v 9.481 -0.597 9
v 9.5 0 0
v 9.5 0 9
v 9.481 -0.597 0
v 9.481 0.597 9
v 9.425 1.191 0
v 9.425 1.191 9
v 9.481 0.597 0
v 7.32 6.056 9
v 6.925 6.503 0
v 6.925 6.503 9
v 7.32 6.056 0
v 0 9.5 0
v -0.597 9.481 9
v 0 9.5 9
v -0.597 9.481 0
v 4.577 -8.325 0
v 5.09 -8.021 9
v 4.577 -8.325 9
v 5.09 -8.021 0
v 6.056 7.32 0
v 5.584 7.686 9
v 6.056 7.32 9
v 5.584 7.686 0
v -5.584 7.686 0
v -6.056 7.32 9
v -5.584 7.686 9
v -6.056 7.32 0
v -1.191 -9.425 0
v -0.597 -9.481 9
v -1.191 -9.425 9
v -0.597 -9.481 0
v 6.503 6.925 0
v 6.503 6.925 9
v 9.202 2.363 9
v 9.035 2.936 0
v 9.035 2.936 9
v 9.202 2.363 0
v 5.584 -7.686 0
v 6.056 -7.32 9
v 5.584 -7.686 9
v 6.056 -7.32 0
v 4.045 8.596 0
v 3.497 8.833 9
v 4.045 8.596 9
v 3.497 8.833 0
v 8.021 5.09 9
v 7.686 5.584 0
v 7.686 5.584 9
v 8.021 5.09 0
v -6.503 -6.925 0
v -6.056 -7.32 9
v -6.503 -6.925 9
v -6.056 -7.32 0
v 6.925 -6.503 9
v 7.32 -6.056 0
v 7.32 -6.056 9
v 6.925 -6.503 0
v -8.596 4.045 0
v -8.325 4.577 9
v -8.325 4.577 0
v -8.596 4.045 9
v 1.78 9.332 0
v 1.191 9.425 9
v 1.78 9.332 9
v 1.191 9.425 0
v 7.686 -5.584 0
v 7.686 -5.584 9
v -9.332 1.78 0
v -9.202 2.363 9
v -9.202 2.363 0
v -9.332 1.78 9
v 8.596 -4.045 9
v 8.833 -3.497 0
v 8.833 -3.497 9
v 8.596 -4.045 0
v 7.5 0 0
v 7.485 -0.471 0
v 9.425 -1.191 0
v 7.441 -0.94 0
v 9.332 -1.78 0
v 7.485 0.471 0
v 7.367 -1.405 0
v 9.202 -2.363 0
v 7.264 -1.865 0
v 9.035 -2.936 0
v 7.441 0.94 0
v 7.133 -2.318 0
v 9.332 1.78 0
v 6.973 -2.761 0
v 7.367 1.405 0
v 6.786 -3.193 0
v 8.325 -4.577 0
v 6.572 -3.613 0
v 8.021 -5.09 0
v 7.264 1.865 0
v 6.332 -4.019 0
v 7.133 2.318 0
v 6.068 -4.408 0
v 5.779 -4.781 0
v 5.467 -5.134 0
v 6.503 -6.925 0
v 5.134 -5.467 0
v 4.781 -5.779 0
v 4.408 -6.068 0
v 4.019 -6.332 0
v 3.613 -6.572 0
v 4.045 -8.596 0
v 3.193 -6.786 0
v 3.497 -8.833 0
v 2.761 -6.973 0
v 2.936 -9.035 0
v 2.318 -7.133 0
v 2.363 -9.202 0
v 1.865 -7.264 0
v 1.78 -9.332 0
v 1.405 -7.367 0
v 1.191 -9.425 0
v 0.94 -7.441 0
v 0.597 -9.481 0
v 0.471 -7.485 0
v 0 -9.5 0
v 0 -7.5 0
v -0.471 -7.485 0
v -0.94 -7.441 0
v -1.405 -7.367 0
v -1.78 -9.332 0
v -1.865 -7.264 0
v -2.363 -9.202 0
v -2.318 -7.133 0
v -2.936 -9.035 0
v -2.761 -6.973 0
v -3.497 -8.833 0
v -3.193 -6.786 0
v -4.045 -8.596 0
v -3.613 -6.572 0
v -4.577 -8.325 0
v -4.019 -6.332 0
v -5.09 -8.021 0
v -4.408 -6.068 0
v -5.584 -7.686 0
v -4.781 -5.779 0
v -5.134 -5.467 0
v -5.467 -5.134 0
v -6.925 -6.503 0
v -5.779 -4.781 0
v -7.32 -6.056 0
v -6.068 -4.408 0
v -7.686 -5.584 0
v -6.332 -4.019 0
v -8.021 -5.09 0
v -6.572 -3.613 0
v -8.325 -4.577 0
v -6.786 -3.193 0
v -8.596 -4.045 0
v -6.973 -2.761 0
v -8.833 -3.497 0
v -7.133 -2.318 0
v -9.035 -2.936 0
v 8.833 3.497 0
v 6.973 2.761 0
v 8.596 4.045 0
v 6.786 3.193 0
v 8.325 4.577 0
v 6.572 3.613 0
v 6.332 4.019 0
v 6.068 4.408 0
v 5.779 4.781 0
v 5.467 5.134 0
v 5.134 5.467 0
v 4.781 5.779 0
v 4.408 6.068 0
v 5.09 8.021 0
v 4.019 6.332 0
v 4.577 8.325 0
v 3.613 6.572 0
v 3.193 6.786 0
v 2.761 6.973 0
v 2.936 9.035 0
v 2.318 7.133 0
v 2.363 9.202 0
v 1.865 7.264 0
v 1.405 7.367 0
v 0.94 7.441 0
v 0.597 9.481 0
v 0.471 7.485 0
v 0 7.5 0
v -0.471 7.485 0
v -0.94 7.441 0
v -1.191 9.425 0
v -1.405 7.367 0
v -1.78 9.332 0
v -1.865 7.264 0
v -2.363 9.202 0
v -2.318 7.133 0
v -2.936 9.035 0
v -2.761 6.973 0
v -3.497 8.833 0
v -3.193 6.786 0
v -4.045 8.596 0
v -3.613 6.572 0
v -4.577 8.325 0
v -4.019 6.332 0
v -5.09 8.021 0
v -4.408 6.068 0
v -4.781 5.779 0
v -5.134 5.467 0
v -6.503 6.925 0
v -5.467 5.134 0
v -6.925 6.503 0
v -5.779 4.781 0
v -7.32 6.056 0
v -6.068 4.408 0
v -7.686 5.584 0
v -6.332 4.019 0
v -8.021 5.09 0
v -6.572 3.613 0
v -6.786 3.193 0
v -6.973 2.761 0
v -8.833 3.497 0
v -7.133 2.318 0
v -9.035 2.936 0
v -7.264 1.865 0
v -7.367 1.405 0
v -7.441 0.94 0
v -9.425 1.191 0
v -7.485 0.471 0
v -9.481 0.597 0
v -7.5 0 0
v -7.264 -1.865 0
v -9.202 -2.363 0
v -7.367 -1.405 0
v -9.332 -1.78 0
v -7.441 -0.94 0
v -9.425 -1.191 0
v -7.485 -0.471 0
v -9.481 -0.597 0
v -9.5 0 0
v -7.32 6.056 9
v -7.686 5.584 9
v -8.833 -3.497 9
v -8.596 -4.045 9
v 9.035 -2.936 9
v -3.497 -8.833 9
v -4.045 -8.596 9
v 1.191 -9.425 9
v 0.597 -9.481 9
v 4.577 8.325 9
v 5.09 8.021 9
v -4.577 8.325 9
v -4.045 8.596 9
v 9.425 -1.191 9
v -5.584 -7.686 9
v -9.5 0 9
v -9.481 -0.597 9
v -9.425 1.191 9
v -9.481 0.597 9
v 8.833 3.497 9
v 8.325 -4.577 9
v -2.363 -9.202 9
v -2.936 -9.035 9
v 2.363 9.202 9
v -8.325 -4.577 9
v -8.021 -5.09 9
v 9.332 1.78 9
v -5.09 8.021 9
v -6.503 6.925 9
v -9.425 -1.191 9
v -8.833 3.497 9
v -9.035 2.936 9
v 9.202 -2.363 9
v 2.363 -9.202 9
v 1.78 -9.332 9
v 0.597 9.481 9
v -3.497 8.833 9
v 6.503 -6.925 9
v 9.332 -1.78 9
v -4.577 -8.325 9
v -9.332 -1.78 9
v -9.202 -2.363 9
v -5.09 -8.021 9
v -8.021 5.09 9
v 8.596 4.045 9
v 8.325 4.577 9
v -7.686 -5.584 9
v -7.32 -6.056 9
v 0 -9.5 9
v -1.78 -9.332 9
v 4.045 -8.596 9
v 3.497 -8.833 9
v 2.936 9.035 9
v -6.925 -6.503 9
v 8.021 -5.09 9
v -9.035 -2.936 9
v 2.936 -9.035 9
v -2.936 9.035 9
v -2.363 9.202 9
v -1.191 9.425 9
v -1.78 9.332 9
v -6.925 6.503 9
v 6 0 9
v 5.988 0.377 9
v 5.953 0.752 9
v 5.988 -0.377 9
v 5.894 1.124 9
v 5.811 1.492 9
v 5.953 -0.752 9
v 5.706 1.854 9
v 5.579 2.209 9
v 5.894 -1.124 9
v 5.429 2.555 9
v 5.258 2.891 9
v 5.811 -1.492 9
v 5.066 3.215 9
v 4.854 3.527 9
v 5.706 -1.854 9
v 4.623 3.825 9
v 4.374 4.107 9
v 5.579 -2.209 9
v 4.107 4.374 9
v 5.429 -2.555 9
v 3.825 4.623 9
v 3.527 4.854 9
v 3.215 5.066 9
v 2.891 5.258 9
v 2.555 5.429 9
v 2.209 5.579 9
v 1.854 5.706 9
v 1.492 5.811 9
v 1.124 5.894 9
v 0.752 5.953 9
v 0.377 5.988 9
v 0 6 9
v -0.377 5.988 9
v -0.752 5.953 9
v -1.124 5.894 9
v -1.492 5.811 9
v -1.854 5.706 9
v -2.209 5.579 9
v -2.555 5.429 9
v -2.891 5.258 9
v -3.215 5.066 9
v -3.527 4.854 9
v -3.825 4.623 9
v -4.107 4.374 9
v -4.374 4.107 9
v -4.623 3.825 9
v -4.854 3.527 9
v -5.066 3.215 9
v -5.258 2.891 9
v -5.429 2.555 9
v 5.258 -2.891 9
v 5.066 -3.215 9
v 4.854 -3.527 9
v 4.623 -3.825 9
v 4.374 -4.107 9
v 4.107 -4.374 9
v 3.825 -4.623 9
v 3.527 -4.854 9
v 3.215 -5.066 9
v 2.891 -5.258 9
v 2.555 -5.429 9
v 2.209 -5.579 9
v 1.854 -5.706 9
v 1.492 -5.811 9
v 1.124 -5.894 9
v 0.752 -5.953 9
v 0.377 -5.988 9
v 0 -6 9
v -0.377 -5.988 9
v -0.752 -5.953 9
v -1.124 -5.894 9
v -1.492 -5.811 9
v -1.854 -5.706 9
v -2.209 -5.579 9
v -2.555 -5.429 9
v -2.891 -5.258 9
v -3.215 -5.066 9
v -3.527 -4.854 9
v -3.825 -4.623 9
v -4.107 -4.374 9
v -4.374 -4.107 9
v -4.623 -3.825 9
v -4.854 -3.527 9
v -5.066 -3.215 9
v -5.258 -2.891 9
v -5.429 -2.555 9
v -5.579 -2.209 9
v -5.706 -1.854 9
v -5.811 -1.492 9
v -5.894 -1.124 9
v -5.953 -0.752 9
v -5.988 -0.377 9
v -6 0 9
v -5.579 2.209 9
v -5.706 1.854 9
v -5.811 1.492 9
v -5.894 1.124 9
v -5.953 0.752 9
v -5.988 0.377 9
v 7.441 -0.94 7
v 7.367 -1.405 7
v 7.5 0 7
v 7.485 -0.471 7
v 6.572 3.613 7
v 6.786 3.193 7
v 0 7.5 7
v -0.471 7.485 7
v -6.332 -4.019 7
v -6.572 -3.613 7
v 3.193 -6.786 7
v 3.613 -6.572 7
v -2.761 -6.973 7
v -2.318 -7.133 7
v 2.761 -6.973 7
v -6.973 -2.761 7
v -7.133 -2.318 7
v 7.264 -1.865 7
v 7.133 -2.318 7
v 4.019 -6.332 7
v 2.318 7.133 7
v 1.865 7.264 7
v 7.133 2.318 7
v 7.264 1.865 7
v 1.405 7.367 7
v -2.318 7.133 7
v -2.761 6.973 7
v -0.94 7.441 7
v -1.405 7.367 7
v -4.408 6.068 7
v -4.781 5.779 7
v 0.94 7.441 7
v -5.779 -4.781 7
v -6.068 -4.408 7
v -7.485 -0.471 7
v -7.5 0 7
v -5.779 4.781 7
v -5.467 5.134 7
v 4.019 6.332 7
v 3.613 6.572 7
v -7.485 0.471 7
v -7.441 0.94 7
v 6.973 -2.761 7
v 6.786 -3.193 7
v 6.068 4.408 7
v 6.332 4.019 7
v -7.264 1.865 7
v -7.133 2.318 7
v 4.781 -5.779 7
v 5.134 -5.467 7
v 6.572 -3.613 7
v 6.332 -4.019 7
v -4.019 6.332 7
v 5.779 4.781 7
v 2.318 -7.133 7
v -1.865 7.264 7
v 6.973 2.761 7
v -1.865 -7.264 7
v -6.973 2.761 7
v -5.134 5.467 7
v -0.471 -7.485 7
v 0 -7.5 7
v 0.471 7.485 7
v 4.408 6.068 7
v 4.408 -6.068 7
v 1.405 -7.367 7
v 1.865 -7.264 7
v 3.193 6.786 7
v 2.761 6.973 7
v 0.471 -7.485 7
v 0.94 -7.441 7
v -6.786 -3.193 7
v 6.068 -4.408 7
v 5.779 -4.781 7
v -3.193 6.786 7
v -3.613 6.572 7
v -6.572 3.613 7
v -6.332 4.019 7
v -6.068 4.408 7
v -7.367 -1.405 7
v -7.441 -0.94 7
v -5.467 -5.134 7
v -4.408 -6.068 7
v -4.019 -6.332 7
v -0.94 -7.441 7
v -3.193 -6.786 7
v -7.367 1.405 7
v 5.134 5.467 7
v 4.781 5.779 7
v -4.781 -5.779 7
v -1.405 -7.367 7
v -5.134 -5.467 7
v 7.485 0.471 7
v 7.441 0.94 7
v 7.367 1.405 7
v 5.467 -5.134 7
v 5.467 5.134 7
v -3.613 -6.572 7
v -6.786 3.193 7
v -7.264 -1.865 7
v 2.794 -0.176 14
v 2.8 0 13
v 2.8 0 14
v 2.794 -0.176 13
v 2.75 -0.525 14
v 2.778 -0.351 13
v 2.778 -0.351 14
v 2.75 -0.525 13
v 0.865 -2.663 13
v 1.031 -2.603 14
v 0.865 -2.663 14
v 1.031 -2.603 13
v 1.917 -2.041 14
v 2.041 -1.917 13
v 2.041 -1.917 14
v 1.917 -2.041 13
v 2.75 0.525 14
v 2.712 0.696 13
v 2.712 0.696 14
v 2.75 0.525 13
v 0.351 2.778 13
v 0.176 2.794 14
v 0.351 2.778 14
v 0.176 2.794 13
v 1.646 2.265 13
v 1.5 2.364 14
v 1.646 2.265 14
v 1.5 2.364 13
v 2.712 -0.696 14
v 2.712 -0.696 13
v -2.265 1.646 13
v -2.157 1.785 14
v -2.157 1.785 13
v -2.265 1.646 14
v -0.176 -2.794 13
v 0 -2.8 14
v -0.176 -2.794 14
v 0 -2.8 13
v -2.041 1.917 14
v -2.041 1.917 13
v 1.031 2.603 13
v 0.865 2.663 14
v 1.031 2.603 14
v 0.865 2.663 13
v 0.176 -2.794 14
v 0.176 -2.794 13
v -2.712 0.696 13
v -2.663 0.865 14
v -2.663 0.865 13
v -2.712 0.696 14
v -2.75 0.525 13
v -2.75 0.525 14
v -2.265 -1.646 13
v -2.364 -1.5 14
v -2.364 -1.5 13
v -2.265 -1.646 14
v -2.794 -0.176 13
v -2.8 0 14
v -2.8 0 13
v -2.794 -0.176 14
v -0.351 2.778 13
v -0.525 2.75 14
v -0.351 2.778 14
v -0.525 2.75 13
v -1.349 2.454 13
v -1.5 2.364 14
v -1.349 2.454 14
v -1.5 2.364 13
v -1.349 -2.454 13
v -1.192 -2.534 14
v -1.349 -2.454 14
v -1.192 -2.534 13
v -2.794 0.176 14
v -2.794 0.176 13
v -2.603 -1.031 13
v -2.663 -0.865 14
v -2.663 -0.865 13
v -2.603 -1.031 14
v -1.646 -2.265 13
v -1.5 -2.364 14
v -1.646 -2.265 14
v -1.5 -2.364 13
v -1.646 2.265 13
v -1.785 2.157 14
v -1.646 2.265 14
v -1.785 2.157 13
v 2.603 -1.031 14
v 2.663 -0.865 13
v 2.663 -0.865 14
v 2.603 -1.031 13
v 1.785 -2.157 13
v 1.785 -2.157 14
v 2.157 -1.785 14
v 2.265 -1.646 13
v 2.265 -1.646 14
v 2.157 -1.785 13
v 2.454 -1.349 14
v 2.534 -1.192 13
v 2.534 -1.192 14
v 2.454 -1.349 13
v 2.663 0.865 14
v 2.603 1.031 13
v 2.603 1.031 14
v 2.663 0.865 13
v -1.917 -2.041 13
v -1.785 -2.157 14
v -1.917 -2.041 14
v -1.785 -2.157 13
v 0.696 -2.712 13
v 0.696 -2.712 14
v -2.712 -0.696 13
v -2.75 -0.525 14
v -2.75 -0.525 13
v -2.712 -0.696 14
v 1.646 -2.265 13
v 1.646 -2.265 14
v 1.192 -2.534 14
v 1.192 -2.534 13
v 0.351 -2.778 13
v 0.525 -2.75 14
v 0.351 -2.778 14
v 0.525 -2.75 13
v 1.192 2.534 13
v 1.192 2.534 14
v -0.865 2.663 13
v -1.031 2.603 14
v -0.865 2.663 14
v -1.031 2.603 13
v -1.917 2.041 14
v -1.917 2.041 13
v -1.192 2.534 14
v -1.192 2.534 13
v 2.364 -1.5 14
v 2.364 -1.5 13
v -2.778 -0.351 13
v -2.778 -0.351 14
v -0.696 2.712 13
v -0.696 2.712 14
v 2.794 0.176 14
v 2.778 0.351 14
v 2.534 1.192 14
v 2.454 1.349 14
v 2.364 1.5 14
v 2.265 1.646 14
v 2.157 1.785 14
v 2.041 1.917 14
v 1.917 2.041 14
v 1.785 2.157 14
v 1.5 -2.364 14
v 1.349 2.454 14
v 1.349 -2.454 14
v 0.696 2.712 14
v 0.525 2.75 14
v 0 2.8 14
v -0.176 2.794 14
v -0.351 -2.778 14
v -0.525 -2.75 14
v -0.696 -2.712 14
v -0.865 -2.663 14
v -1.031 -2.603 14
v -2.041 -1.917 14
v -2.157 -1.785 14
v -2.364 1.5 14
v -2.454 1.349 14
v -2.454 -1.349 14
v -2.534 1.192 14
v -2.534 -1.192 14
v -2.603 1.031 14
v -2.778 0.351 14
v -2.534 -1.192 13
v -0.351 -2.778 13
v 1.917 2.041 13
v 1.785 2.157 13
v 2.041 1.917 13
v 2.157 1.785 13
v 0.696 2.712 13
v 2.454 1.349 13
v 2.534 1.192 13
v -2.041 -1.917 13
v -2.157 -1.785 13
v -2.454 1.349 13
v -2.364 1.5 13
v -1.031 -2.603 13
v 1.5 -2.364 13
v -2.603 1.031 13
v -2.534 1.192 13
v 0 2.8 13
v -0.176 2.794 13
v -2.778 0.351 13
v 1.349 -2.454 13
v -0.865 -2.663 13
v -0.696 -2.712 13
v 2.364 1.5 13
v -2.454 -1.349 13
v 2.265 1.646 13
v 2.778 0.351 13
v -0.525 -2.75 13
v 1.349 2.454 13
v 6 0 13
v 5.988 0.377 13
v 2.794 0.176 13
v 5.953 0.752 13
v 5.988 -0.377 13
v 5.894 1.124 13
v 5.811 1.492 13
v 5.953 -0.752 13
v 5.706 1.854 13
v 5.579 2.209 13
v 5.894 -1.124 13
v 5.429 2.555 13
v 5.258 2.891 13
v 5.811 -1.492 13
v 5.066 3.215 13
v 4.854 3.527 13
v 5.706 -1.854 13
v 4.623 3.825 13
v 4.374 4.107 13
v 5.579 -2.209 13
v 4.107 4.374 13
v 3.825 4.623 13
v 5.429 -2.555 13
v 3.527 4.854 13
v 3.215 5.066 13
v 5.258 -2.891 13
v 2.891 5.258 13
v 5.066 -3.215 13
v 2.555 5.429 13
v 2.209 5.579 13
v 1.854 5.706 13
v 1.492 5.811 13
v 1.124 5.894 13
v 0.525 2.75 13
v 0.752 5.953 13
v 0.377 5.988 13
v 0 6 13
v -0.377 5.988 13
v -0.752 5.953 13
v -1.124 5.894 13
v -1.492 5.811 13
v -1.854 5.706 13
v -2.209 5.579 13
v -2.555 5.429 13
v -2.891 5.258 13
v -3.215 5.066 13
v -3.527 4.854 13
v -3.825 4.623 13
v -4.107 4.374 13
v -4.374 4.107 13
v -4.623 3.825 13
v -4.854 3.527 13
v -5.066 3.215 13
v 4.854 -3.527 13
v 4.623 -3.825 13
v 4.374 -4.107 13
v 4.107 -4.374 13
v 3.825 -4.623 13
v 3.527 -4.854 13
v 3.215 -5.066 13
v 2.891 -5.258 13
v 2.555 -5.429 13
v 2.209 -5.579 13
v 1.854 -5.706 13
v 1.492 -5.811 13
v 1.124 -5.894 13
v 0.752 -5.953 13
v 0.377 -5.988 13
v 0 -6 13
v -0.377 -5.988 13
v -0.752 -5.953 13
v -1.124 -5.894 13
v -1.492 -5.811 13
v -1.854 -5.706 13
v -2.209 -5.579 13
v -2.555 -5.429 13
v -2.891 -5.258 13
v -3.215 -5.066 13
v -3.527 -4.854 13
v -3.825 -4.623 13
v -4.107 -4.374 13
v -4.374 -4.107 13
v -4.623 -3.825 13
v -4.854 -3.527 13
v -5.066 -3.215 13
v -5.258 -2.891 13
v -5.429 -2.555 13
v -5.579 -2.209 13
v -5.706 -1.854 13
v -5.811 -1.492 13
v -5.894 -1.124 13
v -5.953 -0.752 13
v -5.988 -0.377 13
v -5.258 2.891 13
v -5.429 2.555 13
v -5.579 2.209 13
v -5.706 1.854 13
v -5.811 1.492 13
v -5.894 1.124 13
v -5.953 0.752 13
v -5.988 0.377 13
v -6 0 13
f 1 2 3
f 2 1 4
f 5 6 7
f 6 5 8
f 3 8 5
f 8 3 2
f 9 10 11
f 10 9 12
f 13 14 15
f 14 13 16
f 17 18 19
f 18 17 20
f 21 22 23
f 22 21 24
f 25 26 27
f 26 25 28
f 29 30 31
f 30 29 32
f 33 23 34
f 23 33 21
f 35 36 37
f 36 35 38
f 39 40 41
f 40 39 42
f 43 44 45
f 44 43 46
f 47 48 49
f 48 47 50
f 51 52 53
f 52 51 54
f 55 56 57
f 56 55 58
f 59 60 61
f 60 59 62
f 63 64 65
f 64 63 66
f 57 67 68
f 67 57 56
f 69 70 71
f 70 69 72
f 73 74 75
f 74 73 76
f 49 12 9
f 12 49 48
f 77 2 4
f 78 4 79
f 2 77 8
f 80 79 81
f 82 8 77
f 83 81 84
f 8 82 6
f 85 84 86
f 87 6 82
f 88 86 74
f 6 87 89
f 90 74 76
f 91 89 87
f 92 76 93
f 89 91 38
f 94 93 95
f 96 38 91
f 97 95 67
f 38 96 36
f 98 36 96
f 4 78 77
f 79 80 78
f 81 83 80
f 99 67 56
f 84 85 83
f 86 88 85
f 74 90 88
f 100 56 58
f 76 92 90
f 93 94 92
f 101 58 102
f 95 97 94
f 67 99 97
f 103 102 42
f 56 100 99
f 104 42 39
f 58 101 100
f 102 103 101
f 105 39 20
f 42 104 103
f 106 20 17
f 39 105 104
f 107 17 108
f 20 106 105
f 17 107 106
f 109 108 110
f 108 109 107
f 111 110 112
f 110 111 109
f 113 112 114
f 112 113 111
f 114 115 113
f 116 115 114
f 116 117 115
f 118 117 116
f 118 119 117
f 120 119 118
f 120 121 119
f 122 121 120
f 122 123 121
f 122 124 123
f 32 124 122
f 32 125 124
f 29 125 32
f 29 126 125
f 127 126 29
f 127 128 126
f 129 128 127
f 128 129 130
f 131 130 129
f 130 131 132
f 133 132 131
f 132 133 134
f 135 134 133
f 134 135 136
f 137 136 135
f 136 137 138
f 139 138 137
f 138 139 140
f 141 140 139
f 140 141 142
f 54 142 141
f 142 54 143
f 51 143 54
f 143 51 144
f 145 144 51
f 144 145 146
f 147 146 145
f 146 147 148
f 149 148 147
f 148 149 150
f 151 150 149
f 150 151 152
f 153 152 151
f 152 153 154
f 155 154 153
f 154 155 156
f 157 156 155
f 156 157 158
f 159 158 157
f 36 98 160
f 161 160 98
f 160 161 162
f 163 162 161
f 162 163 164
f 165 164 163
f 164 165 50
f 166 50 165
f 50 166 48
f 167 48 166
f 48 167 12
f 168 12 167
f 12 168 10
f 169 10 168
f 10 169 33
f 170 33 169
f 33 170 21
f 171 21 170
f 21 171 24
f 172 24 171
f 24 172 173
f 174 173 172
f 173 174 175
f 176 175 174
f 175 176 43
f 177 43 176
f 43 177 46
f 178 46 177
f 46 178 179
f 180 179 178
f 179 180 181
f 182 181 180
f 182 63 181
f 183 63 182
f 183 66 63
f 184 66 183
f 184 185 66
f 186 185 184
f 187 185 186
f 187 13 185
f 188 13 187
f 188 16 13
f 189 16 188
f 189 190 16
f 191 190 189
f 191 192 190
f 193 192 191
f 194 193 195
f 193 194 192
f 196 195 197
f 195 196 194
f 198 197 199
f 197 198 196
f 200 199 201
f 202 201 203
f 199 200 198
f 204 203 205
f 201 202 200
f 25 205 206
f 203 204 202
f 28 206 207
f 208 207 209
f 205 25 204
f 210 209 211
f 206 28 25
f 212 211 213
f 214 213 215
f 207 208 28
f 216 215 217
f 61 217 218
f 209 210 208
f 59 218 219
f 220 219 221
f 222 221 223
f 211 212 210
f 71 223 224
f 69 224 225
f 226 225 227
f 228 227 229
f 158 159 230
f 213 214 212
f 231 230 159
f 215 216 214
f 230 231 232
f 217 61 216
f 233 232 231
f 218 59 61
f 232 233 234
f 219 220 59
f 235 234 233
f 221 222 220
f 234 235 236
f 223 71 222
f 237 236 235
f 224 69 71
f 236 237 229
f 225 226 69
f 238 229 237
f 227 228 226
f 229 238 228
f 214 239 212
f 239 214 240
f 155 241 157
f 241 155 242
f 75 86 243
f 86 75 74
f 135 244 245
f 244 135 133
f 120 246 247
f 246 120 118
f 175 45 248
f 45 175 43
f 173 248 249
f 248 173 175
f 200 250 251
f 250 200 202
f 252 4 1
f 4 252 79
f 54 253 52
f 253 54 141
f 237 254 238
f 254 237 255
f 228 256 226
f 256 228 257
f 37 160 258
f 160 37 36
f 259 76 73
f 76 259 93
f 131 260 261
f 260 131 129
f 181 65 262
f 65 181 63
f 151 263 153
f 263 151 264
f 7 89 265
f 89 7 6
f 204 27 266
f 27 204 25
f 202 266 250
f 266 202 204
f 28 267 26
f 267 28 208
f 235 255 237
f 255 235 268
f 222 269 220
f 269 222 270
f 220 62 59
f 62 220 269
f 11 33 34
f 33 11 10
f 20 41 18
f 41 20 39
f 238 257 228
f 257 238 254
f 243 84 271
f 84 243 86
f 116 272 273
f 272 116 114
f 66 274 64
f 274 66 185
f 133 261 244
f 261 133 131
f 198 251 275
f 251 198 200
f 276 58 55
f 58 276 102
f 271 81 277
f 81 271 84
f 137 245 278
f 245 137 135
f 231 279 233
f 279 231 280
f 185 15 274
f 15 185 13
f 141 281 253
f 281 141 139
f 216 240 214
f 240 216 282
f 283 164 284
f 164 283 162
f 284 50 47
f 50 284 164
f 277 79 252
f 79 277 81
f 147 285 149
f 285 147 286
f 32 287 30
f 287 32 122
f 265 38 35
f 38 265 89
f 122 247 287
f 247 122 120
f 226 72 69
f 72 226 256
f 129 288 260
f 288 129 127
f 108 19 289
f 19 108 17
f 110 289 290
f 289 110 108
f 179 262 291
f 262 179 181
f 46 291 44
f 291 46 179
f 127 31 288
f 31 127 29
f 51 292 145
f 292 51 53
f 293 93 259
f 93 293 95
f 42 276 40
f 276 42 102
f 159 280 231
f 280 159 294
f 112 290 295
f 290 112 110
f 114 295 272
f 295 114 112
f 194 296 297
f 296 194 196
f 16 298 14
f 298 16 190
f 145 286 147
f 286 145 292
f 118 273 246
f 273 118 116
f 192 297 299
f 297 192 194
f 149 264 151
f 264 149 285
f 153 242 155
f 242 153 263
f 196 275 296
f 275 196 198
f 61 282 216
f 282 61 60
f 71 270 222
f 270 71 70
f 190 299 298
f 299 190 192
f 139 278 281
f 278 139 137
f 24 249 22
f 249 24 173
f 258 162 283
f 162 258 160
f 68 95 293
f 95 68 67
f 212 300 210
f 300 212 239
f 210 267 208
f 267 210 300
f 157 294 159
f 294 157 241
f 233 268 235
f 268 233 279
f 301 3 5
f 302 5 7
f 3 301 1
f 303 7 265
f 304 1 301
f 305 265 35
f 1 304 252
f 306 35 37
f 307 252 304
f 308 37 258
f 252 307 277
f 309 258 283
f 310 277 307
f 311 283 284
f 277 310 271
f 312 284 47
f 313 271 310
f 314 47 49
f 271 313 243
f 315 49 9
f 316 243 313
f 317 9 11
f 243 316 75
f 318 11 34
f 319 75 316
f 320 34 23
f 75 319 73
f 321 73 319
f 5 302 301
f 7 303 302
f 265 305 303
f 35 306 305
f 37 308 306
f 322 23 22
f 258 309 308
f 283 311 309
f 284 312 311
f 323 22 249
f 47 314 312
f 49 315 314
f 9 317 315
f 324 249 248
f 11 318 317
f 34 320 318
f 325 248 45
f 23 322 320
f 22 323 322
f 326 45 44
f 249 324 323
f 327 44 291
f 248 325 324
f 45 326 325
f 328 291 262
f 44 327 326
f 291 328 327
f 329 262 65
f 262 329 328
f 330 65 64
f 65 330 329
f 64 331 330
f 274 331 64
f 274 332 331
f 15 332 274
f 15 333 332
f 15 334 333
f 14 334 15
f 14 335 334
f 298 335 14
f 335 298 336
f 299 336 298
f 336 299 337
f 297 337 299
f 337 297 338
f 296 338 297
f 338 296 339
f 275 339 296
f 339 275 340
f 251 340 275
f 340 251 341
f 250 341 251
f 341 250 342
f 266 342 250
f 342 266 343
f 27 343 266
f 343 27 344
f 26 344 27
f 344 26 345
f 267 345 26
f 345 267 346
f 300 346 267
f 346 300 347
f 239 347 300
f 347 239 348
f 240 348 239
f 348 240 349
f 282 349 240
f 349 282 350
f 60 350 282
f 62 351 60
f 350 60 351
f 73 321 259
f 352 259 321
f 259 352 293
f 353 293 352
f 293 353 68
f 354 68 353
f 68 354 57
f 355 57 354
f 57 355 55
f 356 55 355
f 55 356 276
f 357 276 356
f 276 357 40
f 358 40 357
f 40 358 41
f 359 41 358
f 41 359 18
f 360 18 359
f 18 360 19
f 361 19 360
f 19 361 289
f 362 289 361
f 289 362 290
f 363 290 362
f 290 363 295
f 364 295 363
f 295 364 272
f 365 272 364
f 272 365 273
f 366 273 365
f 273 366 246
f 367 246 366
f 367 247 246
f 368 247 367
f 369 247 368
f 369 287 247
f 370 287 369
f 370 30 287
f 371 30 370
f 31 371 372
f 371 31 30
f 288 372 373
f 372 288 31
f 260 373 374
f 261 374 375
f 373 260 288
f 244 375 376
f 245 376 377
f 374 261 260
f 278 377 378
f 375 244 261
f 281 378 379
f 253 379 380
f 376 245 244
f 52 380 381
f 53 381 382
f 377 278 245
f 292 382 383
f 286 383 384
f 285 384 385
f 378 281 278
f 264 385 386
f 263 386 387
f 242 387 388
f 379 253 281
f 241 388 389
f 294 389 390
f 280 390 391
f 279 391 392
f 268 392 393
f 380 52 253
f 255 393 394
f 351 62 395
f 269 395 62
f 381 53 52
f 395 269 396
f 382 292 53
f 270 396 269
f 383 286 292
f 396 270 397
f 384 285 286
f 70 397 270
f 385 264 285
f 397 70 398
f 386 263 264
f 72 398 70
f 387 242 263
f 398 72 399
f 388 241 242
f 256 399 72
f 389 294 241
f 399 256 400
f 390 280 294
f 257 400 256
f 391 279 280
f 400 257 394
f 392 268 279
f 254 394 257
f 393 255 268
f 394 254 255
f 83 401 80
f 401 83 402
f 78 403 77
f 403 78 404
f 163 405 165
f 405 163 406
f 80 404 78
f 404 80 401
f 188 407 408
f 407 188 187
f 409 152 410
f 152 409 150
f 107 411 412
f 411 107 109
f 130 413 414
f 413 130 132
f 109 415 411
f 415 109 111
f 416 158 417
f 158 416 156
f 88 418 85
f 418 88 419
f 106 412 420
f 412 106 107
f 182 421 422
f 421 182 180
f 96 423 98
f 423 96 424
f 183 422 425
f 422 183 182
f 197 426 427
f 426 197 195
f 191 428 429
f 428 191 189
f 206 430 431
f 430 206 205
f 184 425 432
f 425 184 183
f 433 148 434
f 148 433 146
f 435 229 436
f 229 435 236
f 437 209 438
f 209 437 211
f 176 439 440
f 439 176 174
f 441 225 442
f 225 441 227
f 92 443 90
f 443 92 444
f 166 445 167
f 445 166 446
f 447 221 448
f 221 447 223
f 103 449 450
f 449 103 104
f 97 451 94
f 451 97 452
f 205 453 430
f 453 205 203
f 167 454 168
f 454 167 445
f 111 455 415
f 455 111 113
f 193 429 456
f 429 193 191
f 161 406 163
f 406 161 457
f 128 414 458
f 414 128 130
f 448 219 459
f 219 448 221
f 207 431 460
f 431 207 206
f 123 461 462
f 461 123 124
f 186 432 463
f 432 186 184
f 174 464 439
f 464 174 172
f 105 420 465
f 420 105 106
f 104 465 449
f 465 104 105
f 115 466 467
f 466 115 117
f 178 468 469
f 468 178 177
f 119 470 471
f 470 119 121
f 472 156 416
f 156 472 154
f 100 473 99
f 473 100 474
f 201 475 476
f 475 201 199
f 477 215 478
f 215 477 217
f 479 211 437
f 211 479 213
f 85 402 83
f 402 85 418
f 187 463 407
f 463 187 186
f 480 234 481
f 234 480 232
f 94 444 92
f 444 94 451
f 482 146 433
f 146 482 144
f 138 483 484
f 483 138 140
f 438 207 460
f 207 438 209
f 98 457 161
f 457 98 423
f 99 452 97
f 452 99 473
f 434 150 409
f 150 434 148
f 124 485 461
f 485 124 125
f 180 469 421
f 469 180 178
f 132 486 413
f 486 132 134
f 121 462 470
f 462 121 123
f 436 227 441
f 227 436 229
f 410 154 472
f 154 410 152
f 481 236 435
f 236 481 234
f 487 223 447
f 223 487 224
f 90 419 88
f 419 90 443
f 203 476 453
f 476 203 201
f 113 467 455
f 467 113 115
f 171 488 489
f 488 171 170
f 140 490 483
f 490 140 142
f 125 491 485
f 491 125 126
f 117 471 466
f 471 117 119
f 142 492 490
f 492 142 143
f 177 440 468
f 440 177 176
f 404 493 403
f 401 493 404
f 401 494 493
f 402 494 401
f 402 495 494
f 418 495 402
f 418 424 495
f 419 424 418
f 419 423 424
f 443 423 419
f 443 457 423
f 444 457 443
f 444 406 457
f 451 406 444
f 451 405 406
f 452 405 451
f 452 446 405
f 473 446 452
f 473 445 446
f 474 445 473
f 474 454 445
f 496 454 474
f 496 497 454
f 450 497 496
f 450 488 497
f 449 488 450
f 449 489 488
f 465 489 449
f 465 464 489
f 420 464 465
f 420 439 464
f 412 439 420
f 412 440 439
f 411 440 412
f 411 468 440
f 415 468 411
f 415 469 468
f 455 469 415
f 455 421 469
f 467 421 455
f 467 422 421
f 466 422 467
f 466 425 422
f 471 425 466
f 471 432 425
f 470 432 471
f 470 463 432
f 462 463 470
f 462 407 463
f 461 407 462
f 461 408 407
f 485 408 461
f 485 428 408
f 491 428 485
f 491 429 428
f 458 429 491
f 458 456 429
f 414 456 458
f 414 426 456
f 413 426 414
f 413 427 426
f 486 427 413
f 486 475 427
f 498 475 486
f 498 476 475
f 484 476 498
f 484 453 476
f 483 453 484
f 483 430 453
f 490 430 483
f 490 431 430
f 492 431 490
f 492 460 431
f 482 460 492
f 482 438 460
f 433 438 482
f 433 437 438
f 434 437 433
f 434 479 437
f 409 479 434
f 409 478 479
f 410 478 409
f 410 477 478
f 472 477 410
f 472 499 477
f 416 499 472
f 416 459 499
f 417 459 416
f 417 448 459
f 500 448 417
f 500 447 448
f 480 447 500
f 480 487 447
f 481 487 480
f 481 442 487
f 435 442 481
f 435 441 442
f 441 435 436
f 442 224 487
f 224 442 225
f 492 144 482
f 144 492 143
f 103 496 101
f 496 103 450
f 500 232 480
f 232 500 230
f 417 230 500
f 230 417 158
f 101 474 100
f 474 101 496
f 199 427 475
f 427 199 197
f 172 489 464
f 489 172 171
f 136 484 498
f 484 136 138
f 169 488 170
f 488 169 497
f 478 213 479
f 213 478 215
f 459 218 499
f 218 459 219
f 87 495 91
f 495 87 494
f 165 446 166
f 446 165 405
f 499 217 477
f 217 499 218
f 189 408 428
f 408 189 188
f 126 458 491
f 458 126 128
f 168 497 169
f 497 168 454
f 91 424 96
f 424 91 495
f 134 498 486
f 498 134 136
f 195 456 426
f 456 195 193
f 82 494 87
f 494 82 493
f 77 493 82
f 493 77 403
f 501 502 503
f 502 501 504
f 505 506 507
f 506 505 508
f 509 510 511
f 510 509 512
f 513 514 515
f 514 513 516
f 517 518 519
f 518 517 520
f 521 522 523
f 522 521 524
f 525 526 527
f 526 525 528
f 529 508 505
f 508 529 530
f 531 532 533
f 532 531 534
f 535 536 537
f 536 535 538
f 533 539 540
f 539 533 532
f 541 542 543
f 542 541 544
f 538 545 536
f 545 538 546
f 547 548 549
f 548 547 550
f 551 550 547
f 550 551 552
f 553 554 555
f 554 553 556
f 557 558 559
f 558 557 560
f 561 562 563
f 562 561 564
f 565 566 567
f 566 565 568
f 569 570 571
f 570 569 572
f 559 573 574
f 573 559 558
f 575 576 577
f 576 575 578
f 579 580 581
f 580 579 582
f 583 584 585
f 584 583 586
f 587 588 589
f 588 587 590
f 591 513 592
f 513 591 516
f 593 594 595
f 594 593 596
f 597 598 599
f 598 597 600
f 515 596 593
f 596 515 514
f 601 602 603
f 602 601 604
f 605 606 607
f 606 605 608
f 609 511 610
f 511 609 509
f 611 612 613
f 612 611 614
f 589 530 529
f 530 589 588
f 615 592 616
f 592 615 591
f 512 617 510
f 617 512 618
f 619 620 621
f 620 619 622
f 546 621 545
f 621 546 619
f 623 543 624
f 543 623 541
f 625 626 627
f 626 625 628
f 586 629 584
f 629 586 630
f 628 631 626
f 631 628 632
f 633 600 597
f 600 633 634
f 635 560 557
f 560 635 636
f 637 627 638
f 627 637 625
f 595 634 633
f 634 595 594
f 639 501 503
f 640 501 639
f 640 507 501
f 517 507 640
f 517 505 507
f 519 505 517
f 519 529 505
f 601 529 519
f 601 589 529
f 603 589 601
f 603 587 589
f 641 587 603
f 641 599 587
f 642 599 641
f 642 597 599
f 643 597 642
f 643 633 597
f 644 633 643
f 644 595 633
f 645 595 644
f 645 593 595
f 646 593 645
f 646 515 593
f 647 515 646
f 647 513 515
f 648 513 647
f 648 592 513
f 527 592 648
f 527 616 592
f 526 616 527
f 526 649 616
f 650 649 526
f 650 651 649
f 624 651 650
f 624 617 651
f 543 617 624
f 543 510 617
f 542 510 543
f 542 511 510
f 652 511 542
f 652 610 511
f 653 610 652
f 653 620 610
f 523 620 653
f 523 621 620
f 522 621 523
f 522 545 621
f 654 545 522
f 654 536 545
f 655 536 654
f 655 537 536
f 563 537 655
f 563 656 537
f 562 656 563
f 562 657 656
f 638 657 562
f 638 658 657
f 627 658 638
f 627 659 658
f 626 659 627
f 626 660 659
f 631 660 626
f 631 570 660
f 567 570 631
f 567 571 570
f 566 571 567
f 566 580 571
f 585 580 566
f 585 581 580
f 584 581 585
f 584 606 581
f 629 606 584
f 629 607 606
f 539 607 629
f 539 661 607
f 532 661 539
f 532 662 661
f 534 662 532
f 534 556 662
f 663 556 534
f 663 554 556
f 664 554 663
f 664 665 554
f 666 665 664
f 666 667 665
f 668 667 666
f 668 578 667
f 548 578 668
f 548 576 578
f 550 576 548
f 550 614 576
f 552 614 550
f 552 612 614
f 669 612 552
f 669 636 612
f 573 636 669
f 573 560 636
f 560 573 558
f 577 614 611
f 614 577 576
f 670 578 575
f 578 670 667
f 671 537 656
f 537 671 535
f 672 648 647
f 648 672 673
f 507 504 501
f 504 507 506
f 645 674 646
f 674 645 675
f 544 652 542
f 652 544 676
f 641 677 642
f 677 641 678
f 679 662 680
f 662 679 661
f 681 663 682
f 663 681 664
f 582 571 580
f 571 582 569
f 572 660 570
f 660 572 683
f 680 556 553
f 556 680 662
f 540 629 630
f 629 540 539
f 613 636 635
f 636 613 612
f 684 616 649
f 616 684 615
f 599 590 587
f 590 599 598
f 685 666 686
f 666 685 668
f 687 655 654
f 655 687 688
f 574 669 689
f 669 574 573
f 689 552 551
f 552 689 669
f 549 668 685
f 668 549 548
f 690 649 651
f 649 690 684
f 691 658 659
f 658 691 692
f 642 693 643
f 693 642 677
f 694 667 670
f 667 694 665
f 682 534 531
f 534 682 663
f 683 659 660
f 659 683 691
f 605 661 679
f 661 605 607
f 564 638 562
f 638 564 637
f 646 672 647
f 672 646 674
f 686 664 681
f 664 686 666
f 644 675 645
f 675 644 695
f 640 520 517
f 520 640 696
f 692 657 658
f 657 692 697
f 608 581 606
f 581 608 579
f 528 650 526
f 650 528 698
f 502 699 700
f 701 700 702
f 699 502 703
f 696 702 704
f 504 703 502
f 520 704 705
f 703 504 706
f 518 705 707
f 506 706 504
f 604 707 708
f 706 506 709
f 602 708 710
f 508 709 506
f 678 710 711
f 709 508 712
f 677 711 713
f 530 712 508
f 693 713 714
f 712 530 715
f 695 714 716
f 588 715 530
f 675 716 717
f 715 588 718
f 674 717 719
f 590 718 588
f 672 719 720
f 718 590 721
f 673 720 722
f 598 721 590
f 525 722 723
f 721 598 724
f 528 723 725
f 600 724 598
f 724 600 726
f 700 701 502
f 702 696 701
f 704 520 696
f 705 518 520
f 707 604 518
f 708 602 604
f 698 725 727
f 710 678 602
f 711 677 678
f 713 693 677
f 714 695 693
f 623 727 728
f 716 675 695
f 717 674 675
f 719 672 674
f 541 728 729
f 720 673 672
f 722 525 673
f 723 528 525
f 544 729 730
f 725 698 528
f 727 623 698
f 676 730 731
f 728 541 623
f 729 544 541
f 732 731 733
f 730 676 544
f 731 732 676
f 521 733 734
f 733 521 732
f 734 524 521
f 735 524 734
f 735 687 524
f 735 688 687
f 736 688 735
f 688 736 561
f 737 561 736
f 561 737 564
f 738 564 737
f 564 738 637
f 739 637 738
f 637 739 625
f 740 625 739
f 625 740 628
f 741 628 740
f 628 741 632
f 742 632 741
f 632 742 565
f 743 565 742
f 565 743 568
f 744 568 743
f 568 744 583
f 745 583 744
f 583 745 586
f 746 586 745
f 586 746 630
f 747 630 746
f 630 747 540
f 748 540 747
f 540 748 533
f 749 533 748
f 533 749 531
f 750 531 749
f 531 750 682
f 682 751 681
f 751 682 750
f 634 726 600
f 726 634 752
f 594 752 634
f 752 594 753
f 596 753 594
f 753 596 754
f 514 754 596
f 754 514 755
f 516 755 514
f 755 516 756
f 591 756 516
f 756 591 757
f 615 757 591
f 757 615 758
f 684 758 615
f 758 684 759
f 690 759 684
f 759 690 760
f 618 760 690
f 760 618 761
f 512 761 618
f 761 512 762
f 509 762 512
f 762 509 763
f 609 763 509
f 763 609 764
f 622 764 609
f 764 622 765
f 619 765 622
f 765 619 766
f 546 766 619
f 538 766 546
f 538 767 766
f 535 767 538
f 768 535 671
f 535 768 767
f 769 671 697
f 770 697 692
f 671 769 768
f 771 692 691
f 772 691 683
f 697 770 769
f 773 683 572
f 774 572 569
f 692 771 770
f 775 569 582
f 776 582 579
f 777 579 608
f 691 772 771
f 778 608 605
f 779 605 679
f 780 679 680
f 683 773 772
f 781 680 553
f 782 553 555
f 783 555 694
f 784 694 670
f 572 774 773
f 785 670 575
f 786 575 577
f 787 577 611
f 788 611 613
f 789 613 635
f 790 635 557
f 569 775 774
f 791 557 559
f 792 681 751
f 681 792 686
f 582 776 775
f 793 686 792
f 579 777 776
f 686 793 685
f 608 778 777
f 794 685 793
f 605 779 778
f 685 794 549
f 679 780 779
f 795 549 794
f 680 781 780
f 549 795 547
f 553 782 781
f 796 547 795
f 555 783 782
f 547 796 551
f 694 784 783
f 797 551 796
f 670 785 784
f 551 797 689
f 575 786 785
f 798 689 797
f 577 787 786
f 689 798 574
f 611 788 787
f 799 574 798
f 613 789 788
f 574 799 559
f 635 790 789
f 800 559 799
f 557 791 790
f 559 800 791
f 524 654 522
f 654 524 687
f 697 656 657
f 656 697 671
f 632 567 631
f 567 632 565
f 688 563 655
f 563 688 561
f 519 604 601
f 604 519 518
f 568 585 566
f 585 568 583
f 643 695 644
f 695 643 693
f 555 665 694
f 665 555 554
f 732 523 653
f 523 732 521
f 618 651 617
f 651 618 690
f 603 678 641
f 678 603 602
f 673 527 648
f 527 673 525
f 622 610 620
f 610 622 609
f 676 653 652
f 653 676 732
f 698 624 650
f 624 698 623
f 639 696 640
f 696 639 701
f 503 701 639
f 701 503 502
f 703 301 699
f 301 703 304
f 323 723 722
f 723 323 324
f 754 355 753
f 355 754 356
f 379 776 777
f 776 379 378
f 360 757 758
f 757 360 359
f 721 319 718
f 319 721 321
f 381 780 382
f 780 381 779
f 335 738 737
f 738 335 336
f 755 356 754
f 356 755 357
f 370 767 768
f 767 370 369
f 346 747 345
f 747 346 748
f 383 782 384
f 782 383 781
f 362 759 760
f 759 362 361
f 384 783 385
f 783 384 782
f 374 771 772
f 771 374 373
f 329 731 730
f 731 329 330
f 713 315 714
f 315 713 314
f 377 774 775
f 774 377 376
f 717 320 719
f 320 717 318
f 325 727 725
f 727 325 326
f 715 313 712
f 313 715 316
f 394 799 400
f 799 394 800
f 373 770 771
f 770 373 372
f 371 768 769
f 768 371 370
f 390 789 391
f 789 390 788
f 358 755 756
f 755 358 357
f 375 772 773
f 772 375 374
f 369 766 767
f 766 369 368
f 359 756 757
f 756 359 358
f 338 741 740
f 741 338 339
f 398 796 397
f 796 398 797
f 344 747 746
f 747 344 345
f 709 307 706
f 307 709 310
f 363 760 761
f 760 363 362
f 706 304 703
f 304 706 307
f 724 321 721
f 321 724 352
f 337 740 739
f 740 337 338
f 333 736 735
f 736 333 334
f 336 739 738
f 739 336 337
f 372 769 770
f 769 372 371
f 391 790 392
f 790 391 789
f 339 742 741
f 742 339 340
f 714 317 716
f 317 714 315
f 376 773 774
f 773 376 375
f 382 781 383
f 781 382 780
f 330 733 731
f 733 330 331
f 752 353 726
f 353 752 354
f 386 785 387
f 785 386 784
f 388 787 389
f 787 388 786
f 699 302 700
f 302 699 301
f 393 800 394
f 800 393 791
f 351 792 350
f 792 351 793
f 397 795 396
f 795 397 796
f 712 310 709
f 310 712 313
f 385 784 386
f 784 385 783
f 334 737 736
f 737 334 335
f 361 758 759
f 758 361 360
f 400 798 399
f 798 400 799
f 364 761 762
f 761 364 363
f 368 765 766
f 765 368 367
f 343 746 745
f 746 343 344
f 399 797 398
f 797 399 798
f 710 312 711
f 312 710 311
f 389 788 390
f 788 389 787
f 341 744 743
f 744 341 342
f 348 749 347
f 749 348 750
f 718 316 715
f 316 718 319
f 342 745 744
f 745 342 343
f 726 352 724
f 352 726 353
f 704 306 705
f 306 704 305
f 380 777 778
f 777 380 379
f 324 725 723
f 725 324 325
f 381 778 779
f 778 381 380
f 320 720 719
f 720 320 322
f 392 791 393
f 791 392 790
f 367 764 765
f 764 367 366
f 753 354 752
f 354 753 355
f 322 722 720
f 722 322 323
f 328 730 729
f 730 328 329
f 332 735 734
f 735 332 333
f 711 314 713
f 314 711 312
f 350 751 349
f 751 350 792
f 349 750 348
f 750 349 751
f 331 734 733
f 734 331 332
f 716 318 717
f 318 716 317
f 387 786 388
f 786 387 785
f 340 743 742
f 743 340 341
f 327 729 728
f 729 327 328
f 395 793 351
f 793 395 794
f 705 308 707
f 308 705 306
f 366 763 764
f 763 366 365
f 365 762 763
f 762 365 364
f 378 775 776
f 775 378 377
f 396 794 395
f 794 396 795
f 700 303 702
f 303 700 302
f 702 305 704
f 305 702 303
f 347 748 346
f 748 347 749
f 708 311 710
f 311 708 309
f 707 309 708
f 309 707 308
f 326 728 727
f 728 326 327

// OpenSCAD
translate([0,0,13]) linear_extrude(1) circle(2.8,$fn=100);
translate([0,0,9]) linear_extrude(4) circle(6,$fn=100);
difference(){
    linear_extrude(9) circle(9.5,$fn=100);
    linear_extrude(7) circle(7.5,$fn=100);
}
